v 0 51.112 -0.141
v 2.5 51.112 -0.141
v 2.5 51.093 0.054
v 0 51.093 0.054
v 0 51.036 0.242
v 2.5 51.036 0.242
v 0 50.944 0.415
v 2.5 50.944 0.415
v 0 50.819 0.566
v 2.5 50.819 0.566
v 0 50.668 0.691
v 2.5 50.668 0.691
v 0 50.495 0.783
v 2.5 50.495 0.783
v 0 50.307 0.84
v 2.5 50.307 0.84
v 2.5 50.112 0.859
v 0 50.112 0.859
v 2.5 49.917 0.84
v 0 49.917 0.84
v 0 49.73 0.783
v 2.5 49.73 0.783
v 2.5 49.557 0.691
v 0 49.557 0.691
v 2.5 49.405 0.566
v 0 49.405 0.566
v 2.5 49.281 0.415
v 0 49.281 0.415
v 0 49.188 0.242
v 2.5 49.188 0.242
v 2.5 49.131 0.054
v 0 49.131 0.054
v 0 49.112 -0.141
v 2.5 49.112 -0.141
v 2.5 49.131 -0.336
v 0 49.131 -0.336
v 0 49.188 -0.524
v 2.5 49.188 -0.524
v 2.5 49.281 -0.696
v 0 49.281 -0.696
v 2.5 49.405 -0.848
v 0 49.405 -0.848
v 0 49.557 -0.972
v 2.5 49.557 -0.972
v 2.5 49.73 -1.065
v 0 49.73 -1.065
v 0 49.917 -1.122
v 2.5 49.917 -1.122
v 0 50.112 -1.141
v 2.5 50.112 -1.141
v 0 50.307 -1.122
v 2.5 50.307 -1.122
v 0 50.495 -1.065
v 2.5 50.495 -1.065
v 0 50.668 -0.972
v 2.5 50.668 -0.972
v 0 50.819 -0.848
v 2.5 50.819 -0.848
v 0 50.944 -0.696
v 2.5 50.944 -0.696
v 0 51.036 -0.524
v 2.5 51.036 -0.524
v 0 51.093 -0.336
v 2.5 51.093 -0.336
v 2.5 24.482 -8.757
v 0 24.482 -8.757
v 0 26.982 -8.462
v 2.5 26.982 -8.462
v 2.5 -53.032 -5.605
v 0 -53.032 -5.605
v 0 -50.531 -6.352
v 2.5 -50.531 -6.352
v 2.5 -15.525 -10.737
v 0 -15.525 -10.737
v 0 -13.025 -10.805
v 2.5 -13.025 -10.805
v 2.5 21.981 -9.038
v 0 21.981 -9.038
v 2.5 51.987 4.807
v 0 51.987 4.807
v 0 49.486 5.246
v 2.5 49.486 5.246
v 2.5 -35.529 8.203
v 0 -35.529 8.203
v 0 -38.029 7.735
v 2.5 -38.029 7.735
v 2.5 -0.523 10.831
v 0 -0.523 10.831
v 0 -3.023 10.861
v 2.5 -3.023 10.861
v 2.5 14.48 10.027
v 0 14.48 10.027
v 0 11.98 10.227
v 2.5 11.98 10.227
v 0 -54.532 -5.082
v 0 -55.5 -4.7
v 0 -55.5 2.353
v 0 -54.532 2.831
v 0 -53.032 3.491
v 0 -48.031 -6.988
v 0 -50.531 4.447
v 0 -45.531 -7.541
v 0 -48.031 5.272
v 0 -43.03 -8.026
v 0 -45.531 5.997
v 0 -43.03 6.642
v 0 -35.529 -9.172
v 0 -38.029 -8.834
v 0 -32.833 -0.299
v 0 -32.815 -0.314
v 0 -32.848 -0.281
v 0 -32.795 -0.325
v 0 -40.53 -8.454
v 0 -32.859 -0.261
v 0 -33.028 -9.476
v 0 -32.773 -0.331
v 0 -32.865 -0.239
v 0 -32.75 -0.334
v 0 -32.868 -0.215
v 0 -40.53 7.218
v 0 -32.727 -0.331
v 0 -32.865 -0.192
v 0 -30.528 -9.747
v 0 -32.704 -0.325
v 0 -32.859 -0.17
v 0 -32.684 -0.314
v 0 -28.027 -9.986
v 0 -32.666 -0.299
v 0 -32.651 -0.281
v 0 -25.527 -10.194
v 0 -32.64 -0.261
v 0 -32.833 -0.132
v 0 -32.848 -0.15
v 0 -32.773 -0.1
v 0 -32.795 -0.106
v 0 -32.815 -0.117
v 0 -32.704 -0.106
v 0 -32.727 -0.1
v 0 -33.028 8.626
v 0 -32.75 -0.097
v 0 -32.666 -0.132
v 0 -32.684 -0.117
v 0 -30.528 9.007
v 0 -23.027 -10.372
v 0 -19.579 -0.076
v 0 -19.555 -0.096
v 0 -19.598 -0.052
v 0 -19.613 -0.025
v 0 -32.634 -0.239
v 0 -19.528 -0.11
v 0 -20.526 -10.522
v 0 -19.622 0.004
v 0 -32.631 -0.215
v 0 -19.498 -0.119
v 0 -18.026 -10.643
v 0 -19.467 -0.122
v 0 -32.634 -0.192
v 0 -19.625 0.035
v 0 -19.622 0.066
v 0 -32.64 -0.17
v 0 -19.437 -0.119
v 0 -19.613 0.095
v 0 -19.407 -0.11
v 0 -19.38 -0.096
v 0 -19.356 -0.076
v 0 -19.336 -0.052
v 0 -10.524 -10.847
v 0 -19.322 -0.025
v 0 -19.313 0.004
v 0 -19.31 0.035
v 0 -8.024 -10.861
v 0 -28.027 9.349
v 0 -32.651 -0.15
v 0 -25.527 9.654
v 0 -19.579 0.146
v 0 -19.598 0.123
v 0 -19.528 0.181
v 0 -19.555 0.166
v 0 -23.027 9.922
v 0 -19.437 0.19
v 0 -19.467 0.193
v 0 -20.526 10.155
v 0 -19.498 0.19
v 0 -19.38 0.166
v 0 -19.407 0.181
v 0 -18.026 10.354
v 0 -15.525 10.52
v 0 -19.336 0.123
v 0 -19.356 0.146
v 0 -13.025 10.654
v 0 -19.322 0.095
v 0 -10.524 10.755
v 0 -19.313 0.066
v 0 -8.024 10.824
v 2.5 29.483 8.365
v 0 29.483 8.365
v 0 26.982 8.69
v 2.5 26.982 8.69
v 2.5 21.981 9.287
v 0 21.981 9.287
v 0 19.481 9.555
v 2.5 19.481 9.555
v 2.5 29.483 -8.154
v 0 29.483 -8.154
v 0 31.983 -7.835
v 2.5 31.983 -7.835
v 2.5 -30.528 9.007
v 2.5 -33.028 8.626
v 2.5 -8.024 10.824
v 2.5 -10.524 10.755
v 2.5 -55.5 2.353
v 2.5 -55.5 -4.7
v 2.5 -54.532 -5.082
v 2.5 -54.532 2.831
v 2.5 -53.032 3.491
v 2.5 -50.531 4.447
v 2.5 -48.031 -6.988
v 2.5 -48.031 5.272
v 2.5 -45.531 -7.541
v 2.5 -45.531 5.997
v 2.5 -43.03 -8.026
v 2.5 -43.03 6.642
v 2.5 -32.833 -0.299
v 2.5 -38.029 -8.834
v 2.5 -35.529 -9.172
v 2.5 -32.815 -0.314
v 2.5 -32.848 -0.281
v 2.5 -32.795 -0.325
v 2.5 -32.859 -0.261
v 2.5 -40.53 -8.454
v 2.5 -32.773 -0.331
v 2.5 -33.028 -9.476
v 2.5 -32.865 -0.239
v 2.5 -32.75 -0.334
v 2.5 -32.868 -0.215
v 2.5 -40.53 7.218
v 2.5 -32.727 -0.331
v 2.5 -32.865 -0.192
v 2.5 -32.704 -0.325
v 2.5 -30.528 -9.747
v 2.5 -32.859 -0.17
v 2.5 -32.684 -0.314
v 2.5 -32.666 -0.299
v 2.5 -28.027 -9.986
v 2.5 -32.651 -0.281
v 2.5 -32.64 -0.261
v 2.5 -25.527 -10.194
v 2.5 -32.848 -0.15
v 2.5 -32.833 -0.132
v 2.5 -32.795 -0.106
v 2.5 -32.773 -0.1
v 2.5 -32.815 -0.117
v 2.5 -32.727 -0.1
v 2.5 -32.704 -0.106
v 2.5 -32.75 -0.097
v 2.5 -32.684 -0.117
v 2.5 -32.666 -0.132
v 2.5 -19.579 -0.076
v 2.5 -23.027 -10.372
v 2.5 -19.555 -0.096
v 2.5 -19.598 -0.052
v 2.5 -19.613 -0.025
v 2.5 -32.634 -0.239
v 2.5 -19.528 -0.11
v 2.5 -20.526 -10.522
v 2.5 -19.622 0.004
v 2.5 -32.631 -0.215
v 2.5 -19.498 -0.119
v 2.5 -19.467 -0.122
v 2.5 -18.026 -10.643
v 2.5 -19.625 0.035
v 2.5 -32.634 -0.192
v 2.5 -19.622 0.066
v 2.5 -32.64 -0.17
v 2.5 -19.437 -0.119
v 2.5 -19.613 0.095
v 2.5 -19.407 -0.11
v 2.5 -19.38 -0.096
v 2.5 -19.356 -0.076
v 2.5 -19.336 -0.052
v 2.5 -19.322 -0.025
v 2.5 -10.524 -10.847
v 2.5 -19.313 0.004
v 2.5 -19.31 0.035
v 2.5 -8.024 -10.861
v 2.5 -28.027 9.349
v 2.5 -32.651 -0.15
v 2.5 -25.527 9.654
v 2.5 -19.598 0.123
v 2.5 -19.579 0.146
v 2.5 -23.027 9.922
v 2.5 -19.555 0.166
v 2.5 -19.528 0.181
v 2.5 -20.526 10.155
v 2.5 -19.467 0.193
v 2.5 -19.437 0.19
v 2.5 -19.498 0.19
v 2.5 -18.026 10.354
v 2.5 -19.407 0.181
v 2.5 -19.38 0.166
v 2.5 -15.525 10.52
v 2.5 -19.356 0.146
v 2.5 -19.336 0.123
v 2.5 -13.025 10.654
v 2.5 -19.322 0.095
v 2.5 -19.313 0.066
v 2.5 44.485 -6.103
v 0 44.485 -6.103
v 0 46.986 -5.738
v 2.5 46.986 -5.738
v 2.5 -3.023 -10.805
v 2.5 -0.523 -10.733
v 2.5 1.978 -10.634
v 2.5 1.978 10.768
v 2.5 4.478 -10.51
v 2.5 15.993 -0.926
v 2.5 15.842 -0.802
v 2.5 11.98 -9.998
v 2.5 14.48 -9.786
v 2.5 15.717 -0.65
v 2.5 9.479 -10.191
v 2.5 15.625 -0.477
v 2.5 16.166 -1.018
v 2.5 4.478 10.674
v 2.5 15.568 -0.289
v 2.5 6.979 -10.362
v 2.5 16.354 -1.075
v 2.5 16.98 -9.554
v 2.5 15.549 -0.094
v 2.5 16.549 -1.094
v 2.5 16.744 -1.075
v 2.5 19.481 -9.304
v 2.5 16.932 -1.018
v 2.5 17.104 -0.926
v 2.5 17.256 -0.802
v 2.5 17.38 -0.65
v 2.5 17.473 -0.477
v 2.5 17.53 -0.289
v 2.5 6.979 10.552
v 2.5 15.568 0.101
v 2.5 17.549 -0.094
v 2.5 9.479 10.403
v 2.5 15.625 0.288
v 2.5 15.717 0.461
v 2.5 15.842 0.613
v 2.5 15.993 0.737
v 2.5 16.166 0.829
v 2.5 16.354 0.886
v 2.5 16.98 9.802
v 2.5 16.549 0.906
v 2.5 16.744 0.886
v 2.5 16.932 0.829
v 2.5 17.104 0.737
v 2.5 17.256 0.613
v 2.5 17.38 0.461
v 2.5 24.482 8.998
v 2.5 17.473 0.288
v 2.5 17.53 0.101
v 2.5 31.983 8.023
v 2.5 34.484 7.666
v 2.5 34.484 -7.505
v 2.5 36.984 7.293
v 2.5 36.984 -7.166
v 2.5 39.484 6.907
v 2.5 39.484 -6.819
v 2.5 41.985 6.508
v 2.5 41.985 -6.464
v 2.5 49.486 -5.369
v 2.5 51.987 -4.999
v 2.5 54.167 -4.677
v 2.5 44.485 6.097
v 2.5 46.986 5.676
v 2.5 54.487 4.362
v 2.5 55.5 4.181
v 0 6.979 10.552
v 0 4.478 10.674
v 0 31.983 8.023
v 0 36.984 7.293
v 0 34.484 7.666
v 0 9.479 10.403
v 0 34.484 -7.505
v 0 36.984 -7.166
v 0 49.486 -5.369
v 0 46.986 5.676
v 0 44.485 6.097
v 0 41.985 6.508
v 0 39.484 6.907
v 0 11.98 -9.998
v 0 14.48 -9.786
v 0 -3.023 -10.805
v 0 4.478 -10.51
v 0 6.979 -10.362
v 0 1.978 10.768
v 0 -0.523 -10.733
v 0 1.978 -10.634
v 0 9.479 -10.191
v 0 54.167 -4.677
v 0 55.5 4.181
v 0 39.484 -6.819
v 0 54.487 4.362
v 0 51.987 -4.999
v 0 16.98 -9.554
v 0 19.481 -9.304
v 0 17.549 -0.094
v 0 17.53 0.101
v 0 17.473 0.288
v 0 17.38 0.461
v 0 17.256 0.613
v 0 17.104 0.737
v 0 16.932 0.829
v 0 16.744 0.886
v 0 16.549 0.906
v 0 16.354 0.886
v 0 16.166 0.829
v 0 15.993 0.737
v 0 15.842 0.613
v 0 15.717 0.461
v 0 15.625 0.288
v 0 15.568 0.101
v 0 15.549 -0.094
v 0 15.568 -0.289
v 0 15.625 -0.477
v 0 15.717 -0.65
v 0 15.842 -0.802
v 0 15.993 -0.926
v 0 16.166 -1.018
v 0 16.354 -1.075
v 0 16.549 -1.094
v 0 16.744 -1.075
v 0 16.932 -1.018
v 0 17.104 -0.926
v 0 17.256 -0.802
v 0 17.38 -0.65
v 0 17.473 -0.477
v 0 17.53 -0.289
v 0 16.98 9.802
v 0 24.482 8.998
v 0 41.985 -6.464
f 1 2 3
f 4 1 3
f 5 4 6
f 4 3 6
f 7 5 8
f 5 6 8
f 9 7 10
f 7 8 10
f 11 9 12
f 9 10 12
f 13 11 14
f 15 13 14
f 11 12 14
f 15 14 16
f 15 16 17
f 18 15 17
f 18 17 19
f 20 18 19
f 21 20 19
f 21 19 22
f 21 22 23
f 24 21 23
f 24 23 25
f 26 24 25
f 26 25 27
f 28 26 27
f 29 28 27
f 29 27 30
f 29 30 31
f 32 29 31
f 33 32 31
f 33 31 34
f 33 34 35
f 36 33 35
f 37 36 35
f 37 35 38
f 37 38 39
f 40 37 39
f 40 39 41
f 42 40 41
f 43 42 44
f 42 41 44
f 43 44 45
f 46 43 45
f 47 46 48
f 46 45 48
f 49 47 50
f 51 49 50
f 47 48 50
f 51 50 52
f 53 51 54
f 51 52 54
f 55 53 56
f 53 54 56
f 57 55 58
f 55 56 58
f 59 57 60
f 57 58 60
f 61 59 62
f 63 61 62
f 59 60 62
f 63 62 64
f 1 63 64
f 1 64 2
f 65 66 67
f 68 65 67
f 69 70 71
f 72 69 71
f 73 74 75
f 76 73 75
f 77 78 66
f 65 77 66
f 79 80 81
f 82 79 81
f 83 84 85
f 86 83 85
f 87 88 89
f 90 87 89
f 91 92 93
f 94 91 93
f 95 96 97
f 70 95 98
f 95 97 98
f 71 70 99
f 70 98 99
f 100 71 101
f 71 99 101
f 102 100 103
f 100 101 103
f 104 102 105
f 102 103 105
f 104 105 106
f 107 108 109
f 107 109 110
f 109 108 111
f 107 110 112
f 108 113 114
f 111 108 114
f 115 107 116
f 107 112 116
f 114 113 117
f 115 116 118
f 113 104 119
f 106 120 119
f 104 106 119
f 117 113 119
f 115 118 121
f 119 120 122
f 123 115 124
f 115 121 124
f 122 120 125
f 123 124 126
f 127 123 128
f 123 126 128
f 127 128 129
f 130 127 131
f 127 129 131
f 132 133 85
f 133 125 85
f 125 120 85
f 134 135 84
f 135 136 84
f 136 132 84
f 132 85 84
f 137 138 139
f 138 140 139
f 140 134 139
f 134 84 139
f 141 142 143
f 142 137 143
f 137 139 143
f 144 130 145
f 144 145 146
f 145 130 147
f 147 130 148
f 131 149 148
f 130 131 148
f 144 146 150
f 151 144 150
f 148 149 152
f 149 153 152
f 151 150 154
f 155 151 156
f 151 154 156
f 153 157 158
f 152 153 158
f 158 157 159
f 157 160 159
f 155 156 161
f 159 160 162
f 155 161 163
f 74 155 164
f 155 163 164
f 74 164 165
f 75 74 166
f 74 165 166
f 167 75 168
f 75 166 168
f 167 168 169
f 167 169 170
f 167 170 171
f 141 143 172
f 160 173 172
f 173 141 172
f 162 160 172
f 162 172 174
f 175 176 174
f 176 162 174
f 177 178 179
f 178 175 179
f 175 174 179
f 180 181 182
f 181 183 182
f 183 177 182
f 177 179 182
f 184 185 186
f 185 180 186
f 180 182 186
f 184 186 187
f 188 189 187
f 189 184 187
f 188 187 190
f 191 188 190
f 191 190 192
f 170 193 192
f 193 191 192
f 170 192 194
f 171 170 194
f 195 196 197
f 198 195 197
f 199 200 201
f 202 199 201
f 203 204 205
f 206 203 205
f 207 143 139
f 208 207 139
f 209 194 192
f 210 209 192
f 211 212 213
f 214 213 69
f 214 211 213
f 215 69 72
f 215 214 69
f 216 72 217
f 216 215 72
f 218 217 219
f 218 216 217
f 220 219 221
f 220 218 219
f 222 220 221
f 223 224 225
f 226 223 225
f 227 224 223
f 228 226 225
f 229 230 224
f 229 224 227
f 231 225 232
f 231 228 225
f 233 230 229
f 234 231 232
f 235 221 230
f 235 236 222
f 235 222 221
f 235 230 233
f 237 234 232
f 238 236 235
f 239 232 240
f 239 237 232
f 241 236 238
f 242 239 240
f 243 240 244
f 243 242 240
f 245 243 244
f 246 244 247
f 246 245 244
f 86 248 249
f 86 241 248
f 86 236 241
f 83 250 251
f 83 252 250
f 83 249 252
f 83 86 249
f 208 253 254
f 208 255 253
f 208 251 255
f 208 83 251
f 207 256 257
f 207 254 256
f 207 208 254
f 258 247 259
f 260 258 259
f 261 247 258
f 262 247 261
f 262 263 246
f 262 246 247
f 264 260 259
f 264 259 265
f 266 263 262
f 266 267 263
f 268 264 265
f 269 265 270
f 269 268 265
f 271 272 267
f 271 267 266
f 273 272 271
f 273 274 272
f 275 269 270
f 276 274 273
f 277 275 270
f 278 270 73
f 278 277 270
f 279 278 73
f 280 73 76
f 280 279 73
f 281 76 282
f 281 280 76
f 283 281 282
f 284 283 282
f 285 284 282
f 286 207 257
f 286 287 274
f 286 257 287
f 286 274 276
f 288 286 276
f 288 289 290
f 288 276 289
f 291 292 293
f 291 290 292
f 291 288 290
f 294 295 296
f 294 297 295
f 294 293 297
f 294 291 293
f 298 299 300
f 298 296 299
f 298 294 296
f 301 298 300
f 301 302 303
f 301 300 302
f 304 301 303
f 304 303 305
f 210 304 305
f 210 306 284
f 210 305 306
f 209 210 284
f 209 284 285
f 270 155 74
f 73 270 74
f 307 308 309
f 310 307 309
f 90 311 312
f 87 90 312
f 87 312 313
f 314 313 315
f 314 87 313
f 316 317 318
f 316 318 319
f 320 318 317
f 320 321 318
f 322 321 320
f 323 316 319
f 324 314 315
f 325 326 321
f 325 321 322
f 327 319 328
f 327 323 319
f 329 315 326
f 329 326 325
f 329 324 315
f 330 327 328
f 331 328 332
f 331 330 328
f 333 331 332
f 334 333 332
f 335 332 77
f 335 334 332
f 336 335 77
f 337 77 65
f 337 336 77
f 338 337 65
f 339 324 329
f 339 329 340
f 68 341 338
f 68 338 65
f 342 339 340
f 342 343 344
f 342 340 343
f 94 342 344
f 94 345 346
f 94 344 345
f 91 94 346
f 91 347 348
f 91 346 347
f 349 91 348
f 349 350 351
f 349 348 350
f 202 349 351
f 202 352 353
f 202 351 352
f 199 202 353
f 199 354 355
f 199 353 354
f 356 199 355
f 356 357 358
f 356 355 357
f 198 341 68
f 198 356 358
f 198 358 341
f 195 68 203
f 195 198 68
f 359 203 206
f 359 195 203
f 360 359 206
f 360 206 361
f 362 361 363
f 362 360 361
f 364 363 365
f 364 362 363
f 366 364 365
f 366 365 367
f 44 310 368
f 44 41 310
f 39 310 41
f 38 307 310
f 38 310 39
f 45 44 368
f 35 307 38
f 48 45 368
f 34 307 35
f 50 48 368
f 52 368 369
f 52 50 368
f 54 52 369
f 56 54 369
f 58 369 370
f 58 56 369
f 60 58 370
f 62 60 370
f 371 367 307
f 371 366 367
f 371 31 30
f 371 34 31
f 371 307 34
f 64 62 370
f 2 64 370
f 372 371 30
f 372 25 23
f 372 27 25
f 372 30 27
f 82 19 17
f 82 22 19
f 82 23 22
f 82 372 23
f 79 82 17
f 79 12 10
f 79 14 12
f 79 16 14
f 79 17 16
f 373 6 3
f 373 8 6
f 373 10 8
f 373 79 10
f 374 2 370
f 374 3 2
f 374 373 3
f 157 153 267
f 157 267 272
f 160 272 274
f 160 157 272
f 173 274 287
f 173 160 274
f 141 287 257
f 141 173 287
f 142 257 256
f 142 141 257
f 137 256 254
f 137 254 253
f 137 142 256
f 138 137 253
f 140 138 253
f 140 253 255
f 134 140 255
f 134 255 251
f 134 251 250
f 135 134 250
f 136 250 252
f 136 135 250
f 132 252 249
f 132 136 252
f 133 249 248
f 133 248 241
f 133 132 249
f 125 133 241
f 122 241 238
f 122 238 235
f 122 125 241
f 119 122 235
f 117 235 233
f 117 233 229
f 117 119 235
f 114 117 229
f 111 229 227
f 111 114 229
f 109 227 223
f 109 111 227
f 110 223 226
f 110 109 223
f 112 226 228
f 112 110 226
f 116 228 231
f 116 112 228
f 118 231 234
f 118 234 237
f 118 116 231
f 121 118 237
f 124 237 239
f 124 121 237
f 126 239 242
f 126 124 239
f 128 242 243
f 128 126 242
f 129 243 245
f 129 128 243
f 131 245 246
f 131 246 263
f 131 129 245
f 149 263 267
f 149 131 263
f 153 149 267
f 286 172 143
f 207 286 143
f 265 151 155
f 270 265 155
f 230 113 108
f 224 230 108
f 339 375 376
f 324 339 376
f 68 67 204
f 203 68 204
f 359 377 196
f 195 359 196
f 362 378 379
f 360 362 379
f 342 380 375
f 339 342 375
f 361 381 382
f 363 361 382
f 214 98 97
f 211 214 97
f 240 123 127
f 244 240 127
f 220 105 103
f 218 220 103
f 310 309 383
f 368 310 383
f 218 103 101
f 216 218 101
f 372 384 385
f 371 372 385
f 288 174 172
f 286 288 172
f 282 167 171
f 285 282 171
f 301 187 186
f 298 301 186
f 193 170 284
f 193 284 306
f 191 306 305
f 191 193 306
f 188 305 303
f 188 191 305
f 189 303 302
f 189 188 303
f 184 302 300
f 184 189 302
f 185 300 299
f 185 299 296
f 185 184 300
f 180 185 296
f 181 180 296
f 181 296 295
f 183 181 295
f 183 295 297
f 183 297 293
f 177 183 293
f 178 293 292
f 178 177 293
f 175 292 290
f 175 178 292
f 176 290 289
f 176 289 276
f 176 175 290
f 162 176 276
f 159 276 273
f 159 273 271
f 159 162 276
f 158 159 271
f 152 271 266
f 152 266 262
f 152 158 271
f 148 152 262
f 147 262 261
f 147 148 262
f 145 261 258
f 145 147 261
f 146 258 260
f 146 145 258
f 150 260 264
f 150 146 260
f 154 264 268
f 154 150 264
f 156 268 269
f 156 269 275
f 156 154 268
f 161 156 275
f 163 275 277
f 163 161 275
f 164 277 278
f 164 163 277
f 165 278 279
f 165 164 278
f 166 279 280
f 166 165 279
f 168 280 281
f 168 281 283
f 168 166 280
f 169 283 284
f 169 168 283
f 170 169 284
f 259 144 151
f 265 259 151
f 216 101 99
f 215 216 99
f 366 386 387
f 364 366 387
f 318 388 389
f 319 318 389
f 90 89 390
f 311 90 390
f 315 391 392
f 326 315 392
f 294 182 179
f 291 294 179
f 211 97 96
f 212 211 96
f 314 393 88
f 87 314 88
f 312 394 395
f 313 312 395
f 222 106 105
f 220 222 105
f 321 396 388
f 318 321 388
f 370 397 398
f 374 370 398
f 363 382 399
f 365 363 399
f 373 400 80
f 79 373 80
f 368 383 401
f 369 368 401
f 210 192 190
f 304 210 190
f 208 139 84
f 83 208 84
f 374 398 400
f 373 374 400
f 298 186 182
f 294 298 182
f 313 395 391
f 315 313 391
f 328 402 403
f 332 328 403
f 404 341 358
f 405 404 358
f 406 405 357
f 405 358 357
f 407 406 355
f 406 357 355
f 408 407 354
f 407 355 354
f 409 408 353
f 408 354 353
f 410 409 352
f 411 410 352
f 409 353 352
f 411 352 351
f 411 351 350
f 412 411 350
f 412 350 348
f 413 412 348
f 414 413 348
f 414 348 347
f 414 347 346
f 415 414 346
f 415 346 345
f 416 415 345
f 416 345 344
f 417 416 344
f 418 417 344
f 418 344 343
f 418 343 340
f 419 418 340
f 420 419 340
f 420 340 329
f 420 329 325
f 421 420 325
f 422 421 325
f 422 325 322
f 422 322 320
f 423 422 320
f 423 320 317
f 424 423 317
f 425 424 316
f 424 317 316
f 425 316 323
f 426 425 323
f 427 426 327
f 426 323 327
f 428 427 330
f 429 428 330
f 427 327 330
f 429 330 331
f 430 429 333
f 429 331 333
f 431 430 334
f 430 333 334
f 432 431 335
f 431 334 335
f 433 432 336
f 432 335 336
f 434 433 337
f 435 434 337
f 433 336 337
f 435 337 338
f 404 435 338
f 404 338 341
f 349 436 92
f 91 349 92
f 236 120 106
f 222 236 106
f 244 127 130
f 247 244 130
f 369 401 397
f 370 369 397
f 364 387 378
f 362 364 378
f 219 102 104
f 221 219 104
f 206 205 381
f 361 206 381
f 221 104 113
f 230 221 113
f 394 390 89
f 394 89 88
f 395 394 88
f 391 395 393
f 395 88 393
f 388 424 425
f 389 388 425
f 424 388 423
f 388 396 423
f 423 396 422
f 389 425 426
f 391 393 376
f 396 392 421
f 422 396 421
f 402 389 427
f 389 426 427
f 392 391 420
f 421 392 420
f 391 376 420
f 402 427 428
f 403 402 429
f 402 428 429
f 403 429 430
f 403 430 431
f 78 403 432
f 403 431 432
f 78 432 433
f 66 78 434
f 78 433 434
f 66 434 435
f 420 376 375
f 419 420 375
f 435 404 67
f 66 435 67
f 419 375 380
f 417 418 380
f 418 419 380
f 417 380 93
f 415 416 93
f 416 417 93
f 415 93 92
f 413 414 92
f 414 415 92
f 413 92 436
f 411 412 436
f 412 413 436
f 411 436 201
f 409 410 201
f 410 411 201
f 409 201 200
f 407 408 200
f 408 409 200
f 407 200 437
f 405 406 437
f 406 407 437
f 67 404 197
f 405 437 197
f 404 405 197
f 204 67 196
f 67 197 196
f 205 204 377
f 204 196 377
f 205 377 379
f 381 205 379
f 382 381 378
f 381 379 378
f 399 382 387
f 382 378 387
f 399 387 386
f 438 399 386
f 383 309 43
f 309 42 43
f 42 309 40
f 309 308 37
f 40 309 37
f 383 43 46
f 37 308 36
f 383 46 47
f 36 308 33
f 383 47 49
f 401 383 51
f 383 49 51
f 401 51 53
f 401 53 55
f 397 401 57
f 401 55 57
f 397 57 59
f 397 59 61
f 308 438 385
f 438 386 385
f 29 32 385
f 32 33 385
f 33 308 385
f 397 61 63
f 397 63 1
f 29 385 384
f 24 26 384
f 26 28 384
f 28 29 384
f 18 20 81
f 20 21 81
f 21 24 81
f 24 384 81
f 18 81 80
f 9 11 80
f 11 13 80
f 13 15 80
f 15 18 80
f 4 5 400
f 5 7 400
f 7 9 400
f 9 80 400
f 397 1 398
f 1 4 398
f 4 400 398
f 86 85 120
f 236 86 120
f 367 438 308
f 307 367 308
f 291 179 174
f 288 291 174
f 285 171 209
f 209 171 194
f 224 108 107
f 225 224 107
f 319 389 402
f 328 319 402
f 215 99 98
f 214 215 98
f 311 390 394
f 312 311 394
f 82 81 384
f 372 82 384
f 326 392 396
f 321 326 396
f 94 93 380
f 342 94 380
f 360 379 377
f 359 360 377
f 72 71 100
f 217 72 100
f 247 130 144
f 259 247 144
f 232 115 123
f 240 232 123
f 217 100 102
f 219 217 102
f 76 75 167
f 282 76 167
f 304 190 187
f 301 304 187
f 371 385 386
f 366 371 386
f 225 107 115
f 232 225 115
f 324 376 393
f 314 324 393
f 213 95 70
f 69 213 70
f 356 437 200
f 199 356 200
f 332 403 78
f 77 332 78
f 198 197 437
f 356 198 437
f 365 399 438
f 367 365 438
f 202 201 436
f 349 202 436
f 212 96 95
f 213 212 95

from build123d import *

# Parameters (mm, degrees)
F0_R     = 0.118131
F0_R_2   = 0.157508
F0_R_3   = 0.059065
F1_DEPTH = 2.5
F2_R     = 1
F3_DEPTH = 2.501


with BuildPart() as f1:
    # F0 (on Right) → F1 (new body)
    with BuildSketch(Plane.YZ):
        Polygon((-54.532161, 2.830809), (-55.5, 2.352854), (-55.5, -4.700424), (-54.532161, -5.08242), (-53.031896, -5.605049), (-50.531455, -6.352232), (-48.031014, -6.988103), (-45.530572, -7.540579), (-43.030131, -8.025684), (-40.52969, -8.45407), (-38.029248, -8.833918), (-35.528807, -9.172383), (-33.028366, -9.475878), (-30.527924, -9.746862), (-28.027483, -9.986058), (-25.527042, -10.194203), (-23.0266, -10.372321), (-20.526159, -10.521548), (-18.025718, -10.642951), (-15.525276, -10.737256), (-13.024835, -10.805046), (-10.524394, -10.846715), (-8.023952, -10.861415), (-8.023952, 10.823828), (-10.524394, 10.755197), (-13.024835, 10.653618), (-15.525276, 10.51967), (-18.025718, 10.35375), (-20.526159, 10.155076), (-23.0266, 9.922314), (-25.527042, 9.654129), (-28.027483, 9.34943), (-30.527924, 9.007203), (-33.028366, 8.626161), (-35.528807, 8.203429), (-38.029248, 7.735369), (-40.52969, 7.21755), (-43.030131, 6.641579), (-45.530572, 5.997213), (-48.031014, 5.272234), (-50.531455, 4.447069), (-53.031896, 3.491109), align=None)
        with Locations((-32.749595, -0.215495)):
            Circle(F0_R, mode=Mode.SUBTRACT)
        with Locations((-19.467313, 0.035113)):
            Circle(F0_R_2, mode=Mode.SUBTRACT)
        Polygon((54.167399, -4.676663), (55.5, 4.180714), (54.487081, 4.362485), (51.98664, 4.807271), (49.486199, 5.245501), (46.985757, 5.675946), (44.485316, 6.097298), (41.984875, 6.508123), (39.484433, 6.907189), (36.983992, 7.293421), (34.483551, 7.665764), (31.983109, 8.023287), (29.482668, 8.365121), (26.982226, 8.69037), (24.481785, 8.997909), (21.981344, 9.286516), (19.480902, 9.554974), (16.980461, 9.802049), (14.48002, 10.026501), (11.979578, 10.227105), (9.479137, 10.402721), (6.978696, 10.55224), (4.478254, 10.674497), (1.977813, 10.767919), (-0.522628, 10.830758), (-3.02307, 10.86139), (-3.02307, -10.804577), (-0.522628, -10.732729), (1.977813, -10.633898), (4.478254, -10.509743), (6.978696, -10.361622), (9.479137, -10.190766), (11.979578, -9.998399), (14.48002, -9.785734), (16.980461, -9.553981), (19.480902, -9.304363), (21.981344, -9.038223), (24.481785, -8.75696), (26.982226, -8.461946), (29.482668, -8.154324), (31.983109, -7.835137), (34.483551, -7.505433), (36.983992, -7.166263), (39.484433, -6.818683), (41.984875, -6.463799), (44.485316, -6.102992), (46.985757, -5.737679), (49.486199, -5.36926), (51.98664, -4.999252), align=None)
        with Locations((16.548928, -0.094404)):
            Circle(F0_R_3, mode=Mode.SUBTRACT)
        with Locations((50.112245, -0.140849)):
            Circle(F0_R_3, mode=Mode.SUBTRACT)
    extrude(amount=F1_DEPTH)

    # F2 (on face) → F3 (cut, through all)
    with BuildSketch(Plane.YZ.offset(2.5)):
        with Locations((16.548928, -0.094404)):
            Circle(F2_R)
        with Locations((50.112245, -0.140849)):
            Circle(F2_R)
    extrude(amount=-F3_DEPTH, mode=Mode.SUBTRACT)


solid = f1.part
